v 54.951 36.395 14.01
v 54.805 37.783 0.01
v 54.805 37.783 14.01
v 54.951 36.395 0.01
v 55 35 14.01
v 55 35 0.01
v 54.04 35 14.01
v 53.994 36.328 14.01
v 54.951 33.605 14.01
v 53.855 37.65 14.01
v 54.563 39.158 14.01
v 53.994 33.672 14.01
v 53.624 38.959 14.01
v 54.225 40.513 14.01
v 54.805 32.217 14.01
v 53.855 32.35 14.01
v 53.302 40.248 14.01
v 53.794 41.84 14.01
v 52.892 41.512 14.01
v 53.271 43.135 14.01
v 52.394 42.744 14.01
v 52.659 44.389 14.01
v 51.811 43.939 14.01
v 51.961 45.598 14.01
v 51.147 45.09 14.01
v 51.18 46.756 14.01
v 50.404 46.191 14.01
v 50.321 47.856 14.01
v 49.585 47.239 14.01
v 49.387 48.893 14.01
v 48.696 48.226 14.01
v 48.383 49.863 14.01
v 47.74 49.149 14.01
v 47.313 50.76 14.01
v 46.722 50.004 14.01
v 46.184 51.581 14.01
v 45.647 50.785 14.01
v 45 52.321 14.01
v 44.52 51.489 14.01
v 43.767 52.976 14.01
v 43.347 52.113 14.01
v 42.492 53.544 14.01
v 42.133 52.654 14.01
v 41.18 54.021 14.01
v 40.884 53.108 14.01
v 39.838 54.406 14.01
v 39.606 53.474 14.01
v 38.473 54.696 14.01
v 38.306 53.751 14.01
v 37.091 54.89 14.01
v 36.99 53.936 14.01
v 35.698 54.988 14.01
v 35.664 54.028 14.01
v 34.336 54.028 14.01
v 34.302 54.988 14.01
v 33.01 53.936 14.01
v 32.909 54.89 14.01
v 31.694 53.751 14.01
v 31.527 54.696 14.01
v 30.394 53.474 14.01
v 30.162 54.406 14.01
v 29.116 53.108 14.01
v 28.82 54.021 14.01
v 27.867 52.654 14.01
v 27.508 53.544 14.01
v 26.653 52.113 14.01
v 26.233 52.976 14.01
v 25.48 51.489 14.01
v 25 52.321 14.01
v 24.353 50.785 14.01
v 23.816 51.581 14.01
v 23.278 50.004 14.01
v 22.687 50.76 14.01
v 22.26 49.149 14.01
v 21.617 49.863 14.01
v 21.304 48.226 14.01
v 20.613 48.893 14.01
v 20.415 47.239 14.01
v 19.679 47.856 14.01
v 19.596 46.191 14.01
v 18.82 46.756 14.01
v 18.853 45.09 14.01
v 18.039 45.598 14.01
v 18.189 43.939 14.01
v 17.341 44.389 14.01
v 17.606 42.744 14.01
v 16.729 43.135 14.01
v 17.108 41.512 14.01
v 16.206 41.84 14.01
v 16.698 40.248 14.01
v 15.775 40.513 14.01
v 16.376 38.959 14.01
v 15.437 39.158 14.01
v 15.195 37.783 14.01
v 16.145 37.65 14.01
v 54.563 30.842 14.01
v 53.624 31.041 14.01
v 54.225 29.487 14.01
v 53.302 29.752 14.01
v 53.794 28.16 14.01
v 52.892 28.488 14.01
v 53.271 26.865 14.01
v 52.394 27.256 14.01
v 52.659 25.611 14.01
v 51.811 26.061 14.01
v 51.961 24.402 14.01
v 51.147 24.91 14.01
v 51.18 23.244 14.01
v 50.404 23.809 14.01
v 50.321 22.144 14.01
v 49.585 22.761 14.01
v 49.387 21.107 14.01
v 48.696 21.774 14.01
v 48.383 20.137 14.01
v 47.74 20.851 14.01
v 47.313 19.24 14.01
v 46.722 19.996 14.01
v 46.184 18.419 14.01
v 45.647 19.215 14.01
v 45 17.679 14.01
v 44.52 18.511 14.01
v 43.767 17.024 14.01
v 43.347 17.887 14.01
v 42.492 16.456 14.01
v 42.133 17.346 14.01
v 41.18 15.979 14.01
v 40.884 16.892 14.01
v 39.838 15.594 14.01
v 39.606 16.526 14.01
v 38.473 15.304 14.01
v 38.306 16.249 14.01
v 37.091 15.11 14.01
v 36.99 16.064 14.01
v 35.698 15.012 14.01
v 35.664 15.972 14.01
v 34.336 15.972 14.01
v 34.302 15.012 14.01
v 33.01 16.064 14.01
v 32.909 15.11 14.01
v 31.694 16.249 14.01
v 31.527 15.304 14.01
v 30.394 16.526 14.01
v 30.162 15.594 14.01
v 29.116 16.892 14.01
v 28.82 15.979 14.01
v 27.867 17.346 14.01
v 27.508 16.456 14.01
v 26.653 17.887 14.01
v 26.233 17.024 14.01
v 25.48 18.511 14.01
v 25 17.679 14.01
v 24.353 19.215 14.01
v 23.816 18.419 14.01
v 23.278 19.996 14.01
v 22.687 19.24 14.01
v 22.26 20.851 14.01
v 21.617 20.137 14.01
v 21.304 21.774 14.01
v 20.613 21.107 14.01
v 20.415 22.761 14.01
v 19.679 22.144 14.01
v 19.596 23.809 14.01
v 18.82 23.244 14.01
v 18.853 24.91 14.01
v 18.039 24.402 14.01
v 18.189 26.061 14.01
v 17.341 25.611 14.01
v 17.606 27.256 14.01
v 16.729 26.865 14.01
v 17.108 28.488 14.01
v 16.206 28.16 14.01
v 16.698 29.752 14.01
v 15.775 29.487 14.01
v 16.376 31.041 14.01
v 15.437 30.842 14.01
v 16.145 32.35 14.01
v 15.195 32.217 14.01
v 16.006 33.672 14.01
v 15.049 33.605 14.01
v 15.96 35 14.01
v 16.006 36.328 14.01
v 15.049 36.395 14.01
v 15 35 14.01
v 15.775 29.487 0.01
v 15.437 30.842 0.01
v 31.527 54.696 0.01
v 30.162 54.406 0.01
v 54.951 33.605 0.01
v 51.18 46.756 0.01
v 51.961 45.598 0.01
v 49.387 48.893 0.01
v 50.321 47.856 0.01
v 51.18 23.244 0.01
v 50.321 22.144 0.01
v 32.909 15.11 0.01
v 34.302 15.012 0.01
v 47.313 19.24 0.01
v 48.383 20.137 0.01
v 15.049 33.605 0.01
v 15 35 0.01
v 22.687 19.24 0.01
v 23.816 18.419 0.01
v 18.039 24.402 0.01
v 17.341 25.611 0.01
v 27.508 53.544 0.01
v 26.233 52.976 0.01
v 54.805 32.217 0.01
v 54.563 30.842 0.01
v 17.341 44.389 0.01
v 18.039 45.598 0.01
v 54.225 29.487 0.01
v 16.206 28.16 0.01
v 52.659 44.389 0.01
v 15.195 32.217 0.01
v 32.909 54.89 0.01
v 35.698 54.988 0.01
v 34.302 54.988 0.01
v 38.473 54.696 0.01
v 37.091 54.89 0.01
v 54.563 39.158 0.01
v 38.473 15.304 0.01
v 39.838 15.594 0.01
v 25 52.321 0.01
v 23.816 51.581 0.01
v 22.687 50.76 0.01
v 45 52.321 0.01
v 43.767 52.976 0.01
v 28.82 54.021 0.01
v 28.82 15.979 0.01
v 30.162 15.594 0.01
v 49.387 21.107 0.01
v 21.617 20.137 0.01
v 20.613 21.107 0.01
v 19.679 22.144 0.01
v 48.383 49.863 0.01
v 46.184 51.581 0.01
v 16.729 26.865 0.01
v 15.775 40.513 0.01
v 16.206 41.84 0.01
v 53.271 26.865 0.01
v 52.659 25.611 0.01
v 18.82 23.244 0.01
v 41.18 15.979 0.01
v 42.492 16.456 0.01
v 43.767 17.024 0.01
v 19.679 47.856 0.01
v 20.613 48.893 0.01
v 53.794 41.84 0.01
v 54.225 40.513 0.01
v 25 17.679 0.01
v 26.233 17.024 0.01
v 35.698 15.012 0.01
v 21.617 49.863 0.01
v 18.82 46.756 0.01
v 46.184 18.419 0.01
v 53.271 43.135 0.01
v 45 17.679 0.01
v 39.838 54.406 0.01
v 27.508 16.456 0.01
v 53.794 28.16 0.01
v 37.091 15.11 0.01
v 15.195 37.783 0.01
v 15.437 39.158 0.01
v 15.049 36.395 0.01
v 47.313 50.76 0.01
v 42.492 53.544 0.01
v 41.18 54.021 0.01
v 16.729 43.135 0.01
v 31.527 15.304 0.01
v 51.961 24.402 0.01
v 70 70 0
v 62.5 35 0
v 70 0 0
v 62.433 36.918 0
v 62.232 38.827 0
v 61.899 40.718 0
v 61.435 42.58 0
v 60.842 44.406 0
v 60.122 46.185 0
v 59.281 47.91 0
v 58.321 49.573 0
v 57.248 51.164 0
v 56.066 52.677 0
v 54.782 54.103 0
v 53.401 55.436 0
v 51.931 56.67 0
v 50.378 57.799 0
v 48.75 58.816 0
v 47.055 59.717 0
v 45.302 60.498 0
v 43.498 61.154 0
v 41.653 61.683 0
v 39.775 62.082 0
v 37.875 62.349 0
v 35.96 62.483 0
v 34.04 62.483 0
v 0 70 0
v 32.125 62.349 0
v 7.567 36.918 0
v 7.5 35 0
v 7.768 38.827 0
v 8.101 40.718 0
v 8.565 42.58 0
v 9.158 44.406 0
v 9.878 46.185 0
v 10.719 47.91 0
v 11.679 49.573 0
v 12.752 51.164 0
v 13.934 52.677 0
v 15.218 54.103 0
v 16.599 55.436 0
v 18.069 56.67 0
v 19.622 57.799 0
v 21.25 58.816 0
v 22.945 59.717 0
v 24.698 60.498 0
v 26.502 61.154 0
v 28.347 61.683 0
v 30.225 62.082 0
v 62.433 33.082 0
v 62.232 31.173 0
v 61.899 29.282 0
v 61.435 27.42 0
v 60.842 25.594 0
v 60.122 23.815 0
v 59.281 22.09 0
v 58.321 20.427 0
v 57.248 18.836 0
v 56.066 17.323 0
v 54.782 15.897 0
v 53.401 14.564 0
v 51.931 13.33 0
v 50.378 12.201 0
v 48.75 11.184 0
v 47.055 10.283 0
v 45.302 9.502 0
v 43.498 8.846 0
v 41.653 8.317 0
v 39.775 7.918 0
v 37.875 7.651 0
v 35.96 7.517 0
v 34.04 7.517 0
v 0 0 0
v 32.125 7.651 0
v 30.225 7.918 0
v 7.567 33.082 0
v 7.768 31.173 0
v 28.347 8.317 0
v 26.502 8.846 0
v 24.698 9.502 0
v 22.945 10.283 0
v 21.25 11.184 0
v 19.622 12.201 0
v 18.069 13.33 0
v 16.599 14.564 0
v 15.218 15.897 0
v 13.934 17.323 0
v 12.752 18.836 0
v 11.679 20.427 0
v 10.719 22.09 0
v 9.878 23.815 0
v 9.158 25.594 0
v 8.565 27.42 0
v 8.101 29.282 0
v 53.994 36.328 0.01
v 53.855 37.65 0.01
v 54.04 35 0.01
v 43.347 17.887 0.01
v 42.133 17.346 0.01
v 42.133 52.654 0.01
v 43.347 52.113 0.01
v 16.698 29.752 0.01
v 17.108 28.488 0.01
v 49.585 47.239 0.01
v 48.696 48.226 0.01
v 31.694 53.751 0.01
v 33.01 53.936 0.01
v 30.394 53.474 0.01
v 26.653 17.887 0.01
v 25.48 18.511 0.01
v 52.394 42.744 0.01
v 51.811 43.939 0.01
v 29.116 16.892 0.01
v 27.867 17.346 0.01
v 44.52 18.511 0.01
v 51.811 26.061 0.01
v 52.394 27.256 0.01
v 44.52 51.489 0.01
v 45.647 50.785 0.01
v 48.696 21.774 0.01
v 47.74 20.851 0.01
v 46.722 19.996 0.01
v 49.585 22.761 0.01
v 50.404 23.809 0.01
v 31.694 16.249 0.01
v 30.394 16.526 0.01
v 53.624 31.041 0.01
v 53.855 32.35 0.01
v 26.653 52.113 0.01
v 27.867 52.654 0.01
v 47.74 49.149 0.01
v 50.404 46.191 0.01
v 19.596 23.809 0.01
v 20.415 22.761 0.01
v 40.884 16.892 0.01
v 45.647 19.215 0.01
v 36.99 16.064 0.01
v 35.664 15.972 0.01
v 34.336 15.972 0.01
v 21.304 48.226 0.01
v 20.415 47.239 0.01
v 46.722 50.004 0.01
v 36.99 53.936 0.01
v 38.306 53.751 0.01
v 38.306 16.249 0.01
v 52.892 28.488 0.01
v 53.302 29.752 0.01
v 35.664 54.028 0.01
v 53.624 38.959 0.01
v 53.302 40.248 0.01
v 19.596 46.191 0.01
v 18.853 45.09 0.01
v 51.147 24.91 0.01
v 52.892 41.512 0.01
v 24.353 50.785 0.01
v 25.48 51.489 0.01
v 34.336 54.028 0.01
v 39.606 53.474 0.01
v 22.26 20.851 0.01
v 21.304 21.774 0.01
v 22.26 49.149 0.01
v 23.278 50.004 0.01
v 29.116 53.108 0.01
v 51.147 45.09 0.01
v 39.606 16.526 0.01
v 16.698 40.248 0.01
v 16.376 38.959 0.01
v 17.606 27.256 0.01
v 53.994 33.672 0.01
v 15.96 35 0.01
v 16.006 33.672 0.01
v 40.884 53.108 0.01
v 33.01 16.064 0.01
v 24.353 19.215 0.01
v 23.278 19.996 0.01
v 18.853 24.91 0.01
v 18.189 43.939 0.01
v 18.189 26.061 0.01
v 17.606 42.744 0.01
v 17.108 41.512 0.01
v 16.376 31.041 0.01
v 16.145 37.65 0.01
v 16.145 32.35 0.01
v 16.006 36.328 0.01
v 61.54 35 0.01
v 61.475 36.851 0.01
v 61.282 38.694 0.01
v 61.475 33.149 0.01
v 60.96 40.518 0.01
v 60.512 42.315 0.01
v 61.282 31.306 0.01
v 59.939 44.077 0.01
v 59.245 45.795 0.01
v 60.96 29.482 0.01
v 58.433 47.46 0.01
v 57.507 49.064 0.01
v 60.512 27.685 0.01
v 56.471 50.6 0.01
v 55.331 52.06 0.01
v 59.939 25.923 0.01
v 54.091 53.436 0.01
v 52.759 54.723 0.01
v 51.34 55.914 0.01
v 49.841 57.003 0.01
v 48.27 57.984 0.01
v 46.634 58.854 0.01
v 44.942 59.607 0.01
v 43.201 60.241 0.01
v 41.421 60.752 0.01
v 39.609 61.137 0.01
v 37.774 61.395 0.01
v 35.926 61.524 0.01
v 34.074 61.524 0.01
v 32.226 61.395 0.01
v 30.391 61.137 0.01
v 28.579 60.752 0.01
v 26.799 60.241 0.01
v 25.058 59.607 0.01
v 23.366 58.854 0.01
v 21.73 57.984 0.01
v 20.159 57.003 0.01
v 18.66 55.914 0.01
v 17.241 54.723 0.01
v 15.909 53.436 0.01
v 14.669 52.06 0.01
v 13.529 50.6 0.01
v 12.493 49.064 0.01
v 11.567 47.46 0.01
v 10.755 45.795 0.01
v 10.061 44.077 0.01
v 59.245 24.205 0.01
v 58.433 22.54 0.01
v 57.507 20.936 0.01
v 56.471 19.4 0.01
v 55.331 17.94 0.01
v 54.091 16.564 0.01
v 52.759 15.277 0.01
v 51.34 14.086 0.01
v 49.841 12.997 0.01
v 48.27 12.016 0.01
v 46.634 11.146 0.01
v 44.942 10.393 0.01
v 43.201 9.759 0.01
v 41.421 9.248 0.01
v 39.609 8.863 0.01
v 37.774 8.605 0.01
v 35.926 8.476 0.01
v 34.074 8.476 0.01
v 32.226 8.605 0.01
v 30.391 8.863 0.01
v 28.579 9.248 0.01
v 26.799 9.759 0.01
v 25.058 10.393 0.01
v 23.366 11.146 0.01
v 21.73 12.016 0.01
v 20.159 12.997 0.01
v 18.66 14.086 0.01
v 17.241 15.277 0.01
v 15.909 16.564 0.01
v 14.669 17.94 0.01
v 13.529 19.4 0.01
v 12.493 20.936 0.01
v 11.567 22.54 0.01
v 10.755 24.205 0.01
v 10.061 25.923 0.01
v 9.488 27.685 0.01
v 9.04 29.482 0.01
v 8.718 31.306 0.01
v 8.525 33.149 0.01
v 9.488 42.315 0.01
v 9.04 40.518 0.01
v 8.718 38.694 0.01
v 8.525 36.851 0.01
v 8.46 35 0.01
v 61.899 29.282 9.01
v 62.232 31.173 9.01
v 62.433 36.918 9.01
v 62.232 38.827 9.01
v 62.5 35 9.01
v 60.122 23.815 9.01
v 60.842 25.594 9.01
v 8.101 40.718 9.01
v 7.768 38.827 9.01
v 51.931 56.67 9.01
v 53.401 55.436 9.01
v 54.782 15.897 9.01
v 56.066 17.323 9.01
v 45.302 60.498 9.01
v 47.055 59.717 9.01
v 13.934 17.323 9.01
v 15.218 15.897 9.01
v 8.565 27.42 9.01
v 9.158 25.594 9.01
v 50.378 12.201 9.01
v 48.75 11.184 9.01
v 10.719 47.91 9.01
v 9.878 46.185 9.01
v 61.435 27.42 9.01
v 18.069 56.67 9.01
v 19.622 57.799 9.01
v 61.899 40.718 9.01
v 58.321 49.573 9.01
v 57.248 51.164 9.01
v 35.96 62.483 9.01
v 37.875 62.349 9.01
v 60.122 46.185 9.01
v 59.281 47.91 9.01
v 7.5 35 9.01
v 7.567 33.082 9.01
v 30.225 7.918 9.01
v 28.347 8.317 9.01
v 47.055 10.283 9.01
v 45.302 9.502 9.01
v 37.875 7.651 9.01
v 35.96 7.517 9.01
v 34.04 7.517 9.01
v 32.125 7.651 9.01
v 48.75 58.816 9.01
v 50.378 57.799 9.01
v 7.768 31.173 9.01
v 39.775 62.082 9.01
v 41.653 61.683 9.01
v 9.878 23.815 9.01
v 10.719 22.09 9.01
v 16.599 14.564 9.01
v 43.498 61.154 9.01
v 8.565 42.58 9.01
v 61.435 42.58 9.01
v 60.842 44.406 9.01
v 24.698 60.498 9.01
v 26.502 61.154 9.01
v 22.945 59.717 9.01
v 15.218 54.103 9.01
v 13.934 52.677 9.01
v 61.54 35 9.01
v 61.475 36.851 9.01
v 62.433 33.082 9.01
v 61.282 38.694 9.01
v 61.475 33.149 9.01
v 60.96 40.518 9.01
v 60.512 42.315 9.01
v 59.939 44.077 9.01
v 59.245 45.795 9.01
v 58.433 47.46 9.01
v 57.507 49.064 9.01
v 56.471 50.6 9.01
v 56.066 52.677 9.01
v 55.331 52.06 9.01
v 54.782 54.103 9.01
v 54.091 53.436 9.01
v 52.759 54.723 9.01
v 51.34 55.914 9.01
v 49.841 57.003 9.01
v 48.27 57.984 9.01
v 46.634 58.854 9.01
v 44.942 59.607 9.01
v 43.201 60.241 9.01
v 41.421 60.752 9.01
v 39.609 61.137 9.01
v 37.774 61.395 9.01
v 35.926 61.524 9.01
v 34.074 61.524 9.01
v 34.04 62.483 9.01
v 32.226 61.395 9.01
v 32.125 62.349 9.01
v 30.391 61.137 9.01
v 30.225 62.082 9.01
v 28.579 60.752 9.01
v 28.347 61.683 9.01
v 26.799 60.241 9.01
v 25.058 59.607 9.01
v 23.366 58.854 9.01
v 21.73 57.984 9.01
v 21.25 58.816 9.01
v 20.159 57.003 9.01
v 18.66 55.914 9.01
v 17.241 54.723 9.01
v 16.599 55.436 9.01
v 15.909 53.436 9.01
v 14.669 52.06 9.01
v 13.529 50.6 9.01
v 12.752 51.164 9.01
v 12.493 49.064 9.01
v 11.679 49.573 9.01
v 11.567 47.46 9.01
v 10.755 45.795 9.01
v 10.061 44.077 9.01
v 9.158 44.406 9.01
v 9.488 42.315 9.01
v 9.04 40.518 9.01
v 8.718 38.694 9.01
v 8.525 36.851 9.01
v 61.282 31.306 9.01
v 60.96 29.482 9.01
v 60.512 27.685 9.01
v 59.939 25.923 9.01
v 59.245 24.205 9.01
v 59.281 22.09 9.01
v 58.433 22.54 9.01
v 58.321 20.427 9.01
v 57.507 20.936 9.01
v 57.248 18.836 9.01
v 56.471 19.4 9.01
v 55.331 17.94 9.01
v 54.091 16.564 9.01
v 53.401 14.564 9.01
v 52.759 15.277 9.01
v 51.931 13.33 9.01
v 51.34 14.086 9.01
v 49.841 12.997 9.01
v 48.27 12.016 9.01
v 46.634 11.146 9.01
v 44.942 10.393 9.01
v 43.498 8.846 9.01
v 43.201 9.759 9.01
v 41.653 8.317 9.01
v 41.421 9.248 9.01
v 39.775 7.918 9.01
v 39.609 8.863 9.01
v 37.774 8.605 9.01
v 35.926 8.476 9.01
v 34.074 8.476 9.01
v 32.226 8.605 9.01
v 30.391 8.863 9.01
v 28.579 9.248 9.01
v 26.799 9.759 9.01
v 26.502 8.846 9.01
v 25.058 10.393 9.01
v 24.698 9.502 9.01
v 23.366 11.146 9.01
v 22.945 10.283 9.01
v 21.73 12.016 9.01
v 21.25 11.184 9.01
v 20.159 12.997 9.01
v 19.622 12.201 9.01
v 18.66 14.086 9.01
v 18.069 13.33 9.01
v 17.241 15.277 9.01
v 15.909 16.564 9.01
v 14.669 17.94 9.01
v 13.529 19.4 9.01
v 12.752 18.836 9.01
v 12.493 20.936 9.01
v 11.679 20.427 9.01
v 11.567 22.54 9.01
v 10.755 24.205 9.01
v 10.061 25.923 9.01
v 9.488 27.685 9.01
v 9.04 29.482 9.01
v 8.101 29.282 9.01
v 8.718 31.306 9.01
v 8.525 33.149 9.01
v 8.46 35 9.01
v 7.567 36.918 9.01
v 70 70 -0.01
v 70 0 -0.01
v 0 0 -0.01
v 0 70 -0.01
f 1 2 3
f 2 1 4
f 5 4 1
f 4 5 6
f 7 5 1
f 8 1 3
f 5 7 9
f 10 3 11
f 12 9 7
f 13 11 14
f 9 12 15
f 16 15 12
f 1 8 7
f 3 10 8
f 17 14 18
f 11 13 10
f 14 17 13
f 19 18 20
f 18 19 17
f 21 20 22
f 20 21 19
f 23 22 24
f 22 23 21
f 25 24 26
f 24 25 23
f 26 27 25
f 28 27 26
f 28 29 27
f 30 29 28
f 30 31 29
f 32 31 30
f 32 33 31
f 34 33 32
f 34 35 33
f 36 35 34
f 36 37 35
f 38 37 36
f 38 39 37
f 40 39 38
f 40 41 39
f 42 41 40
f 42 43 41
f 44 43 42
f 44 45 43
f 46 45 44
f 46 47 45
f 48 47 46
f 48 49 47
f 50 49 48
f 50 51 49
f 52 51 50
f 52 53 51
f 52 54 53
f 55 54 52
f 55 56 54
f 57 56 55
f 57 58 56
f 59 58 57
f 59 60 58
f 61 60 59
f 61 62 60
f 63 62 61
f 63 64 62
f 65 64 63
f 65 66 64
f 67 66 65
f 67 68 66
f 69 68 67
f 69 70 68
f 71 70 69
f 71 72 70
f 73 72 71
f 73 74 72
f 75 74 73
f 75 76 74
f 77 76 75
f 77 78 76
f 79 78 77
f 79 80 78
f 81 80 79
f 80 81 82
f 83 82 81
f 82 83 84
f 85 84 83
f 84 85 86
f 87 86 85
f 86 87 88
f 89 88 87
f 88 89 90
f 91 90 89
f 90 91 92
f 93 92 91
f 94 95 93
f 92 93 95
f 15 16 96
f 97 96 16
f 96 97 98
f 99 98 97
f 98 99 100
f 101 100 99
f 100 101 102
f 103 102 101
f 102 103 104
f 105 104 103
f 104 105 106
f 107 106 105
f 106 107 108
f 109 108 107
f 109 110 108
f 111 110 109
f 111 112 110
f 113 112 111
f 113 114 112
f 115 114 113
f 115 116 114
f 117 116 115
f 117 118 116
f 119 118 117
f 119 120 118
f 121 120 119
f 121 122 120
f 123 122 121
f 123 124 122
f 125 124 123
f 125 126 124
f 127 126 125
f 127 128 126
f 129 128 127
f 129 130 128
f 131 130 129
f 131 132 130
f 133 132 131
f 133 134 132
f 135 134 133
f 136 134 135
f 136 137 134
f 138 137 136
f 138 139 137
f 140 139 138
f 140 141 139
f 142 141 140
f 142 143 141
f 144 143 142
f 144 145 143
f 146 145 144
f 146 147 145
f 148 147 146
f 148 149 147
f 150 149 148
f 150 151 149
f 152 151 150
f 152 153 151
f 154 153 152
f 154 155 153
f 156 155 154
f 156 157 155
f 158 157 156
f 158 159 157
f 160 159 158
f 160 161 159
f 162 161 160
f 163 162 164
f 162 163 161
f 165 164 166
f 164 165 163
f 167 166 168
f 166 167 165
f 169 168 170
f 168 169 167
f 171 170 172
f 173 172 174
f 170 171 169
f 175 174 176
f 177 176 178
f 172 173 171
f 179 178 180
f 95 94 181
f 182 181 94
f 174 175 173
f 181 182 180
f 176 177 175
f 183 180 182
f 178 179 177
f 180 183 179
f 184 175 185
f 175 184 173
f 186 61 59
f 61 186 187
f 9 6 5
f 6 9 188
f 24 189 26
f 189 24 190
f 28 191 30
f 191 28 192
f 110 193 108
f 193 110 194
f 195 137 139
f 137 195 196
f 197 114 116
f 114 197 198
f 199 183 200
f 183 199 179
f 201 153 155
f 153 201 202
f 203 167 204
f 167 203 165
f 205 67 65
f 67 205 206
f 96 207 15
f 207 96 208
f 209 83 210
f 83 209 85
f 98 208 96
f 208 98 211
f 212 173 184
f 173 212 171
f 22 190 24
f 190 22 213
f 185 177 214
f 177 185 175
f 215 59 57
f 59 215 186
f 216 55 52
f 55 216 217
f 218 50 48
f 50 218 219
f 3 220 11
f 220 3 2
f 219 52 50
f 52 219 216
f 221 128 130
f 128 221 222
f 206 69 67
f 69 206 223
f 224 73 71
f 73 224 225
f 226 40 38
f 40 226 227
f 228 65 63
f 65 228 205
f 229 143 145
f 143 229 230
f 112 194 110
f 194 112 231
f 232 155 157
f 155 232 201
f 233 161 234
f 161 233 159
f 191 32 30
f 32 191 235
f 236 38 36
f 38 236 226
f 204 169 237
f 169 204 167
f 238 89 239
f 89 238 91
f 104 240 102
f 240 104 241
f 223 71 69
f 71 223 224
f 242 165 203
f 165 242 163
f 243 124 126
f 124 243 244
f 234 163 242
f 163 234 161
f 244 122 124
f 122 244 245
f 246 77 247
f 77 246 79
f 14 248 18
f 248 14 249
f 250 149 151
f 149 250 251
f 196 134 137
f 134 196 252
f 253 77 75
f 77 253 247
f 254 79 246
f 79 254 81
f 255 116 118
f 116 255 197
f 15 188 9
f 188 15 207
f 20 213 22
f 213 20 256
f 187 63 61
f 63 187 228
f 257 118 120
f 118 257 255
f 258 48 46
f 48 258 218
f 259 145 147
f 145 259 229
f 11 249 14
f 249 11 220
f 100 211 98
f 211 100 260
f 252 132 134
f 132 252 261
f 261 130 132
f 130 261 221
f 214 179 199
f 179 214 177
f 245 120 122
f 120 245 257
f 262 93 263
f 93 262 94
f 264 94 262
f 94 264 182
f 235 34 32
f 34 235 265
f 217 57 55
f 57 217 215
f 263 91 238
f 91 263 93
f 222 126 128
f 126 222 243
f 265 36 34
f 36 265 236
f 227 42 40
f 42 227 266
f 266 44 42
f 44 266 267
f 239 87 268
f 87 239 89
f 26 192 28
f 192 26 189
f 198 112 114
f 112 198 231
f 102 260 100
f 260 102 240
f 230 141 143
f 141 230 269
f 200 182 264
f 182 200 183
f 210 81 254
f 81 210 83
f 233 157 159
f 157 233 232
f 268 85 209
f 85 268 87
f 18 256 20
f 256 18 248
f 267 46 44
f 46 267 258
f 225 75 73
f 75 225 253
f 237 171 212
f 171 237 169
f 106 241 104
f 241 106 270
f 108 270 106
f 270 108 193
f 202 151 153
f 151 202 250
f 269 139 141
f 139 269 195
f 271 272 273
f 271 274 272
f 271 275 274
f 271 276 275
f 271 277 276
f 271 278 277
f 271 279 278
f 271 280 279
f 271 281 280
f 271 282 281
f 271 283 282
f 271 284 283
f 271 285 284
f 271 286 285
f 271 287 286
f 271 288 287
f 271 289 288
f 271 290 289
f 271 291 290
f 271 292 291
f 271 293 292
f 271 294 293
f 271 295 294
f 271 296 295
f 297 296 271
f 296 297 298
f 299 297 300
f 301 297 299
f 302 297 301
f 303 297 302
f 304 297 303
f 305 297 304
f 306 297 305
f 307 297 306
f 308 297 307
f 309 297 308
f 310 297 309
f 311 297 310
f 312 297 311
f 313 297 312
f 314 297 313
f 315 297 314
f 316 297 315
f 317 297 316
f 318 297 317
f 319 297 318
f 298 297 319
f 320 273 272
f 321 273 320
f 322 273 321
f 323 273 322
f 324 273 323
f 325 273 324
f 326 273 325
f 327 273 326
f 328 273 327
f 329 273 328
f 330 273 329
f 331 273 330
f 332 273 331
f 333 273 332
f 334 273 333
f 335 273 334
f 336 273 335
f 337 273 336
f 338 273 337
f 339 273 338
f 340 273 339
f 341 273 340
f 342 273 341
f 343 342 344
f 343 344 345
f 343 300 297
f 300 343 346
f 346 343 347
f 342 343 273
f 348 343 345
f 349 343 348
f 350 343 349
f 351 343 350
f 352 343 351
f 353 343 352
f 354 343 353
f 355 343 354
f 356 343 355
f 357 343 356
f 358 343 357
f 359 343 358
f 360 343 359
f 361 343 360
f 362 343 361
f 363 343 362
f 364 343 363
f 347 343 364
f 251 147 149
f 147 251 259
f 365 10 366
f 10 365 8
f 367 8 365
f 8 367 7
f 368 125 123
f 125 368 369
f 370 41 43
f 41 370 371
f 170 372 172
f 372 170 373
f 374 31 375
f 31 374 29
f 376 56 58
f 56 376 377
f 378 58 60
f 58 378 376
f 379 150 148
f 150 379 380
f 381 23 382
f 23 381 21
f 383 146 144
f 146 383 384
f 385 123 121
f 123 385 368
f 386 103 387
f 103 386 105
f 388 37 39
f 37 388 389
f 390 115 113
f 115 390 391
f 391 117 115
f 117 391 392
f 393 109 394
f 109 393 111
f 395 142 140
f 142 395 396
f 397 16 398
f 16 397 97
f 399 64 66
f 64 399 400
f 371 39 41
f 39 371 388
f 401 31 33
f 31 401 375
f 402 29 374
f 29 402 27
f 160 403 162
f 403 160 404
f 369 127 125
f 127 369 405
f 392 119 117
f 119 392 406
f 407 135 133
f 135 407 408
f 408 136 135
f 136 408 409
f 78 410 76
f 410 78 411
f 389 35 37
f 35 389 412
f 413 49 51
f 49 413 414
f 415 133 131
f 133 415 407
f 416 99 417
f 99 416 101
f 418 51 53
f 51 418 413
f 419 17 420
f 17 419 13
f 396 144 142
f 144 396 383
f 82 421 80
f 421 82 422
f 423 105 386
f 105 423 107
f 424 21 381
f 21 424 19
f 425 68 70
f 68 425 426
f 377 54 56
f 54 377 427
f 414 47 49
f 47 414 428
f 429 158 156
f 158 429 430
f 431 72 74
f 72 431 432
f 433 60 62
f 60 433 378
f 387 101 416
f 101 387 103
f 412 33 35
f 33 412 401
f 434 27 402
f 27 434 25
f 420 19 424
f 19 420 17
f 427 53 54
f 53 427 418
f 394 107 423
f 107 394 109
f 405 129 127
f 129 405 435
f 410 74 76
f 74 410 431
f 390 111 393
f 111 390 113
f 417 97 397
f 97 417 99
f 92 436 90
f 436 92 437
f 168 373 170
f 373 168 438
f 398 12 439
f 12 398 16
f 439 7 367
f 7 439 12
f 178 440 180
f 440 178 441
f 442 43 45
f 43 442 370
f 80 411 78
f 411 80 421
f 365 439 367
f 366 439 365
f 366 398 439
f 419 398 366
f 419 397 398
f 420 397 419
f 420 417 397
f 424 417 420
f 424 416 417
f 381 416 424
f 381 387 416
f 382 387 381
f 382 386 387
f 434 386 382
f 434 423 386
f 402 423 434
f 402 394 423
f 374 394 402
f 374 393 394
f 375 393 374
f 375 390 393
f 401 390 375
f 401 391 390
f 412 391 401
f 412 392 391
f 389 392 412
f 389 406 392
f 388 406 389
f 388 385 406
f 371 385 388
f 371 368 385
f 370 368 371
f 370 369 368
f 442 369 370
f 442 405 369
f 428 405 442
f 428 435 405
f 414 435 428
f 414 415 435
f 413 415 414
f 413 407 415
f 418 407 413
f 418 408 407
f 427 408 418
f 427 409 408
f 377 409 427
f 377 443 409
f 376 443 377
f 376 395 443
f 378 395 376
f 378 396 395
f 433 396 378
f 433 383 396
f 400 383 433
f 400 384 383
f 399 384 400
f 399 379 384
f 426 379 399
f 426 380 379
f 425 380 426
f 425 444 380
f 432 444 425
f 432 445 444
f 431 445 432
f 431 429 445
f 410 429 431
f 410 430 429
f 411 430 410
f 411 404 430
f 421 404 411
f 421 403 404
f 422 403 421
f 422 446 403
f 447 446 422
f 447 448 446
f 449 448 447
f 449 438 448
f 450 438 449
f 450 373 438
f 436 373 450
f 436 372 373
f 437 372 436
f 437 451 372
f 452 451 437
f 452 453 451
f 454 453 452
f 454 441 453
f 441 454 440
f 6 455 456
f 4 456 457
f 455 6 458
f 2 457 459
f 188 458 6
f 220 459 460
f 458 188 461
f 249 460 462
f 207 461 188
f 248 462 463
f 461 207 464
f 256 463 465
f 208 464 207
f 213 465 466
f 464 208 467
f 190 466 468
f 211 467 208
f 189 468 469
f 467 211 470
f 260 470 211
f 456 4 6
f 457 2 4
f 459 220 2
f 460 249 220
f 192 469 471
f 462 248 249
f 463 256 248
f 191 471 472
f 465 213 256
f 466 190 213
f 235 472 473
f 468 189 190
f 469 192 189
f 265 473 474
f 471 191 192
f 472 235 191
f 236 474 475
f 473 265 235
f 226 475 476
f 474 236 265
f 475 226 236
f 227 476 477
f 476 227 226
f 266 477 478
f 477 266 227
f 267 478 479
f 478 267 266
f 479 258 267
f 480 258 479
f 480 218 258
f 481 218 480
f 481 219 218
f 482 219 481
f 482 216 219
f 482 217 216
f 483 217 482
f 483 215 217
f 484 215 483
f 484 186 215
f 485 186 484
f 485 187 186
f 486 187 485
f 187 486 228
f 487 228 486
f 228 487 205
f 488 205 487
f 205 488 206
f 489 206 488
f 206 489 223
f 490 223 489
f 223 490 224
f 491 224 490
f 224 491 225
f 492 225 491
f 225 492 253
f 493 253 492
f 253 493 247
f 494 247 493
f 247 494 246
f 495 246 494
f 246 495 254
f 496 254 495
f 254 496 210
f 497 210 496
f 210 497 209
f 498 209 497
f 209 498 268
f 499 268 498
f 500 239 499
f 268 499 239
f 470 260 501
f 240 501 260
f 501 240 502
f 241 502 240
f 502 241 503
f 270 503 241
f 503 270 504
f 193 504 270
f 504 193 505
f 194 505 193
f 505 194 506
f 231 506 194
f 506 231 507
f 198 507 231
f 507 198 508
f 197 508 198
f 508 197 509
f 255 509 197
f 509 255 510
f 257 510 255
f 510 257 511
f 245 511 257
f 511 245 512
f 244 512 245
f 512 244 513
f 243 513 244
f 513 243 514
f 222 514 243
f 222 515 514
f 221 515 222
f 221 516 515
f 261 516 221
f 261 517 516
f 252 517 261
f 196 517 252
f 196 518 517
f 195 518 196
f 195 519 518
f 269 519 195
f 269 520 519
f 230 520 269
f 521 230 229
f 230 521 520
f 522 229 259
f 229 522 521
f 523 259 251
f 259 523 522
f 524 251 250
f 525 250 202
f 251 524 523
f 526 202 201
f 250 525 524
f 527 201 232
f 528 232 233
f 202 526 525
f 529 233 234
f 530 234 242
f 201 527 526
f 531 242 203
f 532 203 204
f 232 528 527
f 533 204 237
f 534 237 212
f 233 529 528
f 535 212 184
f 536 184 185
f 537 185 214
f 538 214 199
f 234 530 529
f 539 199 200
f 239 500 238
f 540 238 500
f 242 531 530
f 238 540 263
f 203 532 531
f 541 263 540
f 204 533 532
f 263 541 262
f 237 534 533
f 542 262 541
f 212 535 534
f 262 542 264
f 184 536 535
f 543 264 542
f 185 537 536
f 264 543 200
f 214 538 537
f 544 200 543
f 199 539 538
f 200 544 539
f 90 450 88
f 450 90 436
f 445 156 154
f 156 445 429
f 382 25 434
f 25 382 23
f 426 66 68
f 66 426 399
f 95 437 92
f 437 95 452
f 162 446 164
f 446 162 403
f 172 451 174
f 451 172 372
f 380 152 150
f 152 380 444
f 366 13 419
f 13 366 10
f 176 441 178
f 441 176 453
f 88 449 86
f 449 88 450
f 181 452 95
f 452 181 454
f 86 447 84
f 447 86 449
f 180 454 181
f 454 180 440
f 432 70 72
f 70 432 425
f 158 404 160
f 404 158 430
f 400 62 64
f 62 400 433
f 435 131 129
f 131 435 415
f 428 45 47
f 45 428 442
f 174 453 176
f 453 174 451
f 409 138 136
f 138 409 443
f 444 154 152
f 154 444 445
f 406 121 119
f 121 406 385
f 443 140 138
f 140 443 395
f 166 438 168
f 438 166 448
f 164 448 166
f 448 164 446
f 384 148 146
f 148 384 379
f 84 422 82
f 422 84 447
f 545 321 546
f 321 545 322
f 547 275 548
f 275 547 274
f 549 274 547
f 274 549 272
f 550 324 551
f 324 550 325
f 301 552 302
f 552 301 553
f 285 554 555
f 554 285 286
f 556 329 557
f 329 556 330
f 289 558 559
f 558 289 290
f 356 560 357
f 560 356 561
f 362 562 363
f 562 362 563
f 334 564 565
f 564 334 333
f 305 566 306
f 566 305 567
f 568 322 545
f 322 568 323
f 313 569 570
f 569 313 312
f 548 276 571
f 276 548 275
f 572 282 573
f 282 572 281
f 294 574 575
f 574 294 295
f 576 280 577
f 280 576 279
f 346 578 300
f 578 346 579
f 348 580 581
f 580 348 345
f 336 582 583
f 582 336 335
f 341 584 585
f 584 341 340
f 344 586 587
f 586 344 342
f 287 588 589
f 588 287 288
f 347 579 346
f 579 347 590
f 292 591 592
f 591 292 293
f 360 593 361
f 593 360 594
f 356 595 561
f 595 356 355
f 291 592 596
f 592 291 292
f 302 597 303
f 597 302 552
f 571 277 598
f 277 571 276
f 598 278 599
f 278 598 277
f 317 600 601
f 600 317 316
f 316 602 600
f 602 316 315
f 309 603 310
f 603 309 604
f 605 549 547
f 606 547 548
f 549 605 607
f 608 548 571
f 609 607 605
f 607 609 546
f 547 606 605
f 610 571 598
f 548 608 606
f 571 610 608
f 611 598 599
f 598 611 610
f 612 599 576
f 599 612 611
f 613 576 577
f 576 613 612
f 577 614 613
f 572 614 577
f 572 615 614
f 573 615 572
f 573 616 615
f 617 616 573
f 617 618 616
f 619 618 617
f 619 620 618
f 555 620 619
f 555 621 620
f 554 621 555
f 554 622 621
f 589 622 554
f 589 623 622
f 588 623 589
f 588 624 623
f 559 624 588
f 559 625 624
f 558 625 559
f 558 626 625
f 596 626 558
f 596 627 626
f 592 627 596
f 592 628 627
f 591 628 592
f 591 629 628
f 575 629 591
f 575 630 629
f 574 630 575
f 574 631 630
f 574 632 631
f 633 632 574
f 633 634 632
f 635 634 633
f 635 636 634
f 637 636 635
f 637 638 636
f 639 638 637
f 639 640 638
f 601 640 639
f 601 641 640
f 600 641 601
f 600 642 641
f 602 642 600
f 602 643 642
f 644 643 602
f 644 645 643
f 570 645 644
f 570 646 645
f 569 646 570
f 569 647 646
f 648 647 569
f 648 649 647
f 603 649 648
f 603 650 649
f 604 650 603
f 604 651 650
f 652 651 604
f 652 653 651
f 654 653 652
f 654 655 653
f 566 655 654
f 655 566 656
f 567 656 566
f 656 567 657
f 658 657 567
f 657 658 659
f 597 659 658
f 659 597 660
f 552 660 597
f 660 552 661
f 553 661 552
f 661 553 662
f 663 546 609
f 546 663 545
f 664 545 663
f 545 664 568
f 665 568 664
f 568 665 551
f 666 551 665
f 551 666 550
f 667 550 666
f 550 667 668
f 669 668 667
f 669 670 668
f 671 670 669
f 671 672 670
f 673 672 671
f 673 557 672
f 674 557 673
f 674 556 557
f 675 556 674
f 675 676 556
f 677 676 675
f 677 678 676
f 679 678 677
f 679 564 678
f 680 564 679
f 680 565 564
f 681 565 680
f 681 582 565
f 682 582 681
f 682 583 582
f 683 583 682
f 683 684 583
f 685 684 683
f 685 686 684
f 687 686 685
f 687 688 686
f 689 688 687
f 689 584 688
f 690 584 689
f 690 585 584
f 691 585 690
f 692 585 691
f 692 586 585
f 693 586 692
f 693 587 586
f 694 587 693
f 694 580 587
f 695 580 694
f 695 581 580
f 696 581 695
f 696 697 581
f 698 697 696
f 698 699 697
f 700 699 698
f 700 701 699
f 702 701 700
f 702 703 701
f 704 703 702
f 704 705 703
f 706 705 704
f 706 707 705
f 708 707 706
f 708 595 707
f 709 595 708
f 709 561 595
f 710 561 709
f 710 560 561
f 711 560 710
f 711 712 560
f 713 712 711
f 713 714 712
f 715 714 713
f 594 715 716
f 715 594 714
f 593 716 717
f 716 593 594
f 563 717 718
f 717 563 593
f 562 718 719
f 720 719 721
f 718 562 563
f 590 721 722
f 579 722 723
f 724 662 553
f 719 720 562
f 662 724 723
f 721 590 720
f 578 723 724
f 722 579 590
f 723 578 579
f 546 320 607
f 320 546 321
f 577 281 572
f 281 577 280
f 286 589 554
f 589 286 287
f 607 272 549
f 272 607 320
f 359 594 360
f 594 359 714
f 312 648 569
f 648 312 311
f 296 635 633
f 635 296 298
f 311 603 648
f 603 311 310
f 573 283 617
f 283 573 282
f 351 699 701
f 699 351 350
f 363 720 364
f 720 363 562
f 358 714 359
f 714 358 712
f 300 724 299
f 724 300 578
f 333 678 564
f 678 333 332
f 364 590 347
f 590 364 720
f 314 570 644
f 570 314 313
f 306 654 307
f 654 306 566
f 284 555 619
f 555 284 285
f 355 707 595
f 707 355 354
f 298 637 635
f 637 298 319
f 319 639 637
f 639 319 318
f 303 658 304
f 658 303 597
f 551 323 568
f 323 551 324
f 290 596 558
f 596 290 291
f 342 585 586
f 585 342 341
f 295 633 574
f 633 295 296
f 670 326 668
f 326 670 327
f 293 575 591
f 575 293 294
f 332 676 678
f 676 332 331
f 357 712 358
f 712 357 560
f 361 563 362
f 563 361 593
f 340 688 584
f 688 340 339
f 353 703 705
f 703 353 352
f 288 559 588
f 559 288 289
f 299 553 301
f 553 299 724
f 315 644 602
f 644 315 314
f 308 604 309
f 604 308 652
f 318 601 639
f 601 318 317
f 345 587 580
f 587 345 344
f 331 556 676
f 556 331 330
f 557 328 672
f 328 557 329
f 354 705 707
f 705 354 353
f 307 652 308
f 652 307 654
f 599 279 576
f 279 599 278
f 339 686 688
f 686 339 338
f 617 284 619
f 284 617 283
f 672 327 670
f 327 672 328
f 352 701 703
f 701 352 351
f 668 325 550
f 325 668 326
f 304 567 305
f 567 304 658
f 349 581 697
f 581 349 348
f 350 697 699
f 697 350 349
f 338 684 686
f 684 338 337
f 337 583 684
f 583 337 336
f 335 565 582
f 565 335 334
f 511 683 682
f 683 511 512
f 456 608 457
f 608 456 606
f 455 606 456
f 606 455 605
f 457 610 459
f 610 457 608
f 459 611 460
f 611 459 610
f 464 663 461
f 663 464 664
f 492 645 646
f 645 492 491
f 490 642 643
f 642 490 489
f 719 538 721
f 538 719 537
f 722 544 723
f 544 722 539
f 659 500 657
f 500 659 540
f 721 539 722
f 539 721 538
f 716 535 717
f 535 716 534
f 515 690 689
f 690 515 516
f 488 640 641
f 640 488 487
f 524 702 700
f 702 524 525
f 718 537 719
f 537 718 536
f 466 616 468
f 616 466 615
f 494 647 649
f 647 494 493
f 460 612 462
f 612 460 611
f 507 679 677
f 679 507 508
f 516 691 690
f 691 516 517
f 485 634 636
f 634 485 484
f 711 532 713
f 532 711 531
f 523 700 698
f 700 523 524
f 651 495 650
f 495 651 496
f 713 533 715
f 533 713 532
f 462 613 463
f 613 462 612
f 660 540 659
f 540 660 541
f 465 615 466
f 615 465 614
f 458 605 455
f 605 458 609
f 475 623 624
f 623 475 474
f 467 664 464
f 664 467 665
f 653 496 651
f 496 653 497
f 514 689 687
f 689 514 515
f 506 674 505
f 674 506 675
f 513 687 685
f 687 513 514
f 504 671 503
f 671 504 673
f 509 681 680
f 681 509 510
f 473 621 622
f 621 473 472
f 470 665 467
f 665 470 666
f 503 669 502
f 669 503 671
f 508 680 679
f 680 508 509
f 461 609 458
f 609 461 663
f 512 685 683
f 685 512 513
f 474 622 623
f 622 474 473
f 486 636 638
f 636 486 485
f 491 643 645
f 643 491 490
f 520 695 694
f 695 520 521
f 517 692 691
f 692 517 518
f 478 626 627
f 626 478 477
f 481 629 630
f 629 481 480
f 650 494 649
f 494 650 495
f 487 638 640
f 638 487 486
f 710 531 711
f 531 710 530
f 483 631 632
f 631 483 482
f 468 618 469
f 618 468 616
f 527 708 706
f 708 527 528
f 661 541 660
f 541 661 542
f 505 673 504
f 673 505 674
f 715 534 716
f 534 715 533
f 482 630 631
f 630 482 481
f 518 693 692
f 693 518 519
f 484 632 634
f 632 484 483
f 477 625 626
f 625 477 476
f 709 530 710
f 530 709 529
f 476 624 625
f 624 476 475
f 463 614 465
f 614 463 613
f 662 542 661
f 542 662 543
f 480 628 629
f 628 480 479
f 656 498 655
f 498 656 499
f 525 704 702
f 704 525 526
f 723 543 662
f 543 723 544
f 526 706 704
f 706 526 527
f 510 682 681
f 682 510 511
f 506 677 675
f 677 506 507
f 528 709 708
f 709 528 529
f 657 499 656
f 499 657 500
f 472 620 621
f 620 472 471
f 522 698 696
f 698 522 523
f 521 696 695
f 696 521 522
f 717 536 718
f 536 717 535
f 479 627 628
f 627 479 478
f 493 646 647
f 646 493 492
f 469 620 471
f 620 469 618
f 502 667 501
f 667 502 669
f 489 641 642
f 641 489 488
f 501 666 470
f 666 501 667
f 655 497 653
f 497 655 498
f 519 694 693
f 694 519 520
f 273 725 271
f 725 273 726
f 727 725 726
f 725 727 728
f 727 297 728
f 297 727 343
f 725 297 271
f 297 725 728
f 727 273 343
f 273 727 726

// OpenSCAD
// file: ../Base/PlacementOptions.scad
// Fischertechnik Box Foundation
// Placement Options

// Alignment
NoAlign = 0;
AlignLeft = 1;
AlignBottom = 2;
AlignCenter = 3;
AlignRight = 4;
AlignTop = 5;

// Element rotation degree steps
rotations = [0, -90, -180, -270];

// Rotation
NoRotation = 0;
Rotate0 = 0;
Rotate90 = 1;
Rotate180 = 2;
Rotate270 = 3;

// Docking (seen from above)
NoDock = -1;
DockLeft = 0;
DockTop = 1;
DockRight = 2;
DockCorner = 2;
DockBottom = 3;

// Web corners
LowerLeft = 0;
UpperLeft = 1;
UpperRight = 2;
LowerRight = 3;

// Web position relative to corner
LeftOfCorner = 0;
RightOfCorner = 1;
// file: ../Base/Boxes.scad
// Fischertechnik Box Foundation
// Pre-designed Boxes

use <Constants.scad>

include <PlacementOptions.scad>

box190Width = 190;
box190Depth = 130;
box130Width = 130;
box130Depth = 95;

// Values are from an original ec3 box
topBottomDifference = 1.5;
outerHeight = 40;
innerHeight = 38.2;
baseThickness = outerHeight - innerHeight;
stackExcess = 5.7;
radius = 3.5;
wallThickness = 1.5;
tolerance = 0.2;
stackOffset = innerHeight - stackExcess;

boxUsageHeight = stackOffset;
boxWallThickness = wallThickness;
boxBaseThickness = baseThickness;
boxWebWidth = 3.0;

// getBoxWallThickness()
// Gets the wall thickness of a Fischertechnik Box
function getBoxWallThickness() = boxWallThickness;

// getBoxUsageHeight()
// Gets the usable height of a Fischertechnik box
function getBoxUsageHeight() = boxUsageHeight;

// getBoxInnerHeight()
// Gets the inner height of a Fischertechnik box, including the stack excess
function getBoxInnerHeight() = innerHeight;

// getBoxBaseThickness()
// Gets the thickness of the Fischertechnik box base.
function getBoxBaseThickness() = boxBaseThickness;

// getBoxWebWidth()
// Gets the width of a box web
function getBoxWebWidth() = boxWebWidth;

// getBox190Space()
// Gets the usable inner space of a Box 190 as an x/y-list
function getBox190Space() = [
    box190Width - 2*getBoxWallThickness() - topBottomDifference, 
    box190Depth - 2*getBoxWallThickness() - topBottomDifference ];

// BoxBase(width, depth)
// Creates an empty stackable Fischertechnik compatible box
// width = Outer width of the box (190, 130, ...)
// depth = Outer depth of the box (130, 95, ...)

module BoxBase(width, depth, height=outerHeight) {    
    thinPlate = 0.01;

    innerHeight = height - baseThickness;    
    
    module BodyPlate(width, depth) {
        translate([radius, radius])
        hull() {
            w = width-2*radius;
            d = depth-2*radius;
            cube([w, d, thinPlate]);
            cylinder(thinPlate, r=radius, $fn=getFragments());
            translate([w, 0])
                cylinder(thinPlate, r=radius, $fn=getFragments());
            translate([w, d])
                cylinder(thinPlate, r=radius, $fn=getFragments());
            translate([0, d])
                cylinder(thinPlate, r=radius, $fn=getFragments());
        }
    }
    
    module Body(tolerance=tolerance) {
        hull() {
            // Bottom with tolerance to fit into the original boxes when stacked
            translate([-wallThickness+tolerance, -wallThickness+tolerance, -baseThickness])
                BodyPlate(width-topBottomDifference-2*tolerance, depth-topBottomDifference-2*tolerance);
            
            // Top
            translate([-wallThickness-topBottomDifference/2, -wallThickness-topBottomDifference/2, innerHeight-thinPlate])
                BodyPlate(width, depth);
         }
    }

    module Cutoff() {
        hull() {
            coWidth = width - 2*wallThickness;
            coDepth = depth - 2*wallThickness;
            
            // Bottom
            BodyPlate(coWidth-topBottomDifference, coDepth-topBottomDifference);

            // Top
            translate([-topBottomDifference/2, -topBottomDifference/2, innerHeight+thinPlate]) 
                BodyPlate(coWidth, coDepth);
        }
    }
    
    difference() {        
        Body();
        Cutoff();
        stackOffset = innerHeight - stackExcess;
        translate([0, 0, stackOffset + baseThickness])
            Body(tolerance=0);
    }
}

// Creates the Fischertechnik empty box 130x190 mm and places it at position 0,0
// 190x130 are the outer sizes, the inner space is slightly smaller. Use getBox190Space() to get the inner sizes.
// The box is positioned that the usable inner space is at the 0,0,0 position. The

module Box190() {
    BoxBase(box190Width, box190Depth);
}

// Gets the usable inner space of a Box 130 as an x/y-list
function getBox130Space() = [
    box130Width - 2*getBoxWallThickness() - topBottomDifference, 
    box130Depth - 2*getBoxWallThickness() - topBottomDifference ];

// Creates the Fischertechnik empty box 95x130 mm and places it at position 0,0
// 190x130 are the outer sizes, the inner space is slightly smaller. Use getBox190Space() to get the inner sizes.
// The box is positioned that the usable inner space is at the 0,0,0 position. The

module Box130() {
    BoxBase(box130Width, box130Depth);
}

// Creates a web at the specified box walls
// corner 0 = LowerLeft, 1 = UpperLeft, 2 = UpperRight, 3 = LowerRight
// side 0 = LeftOfCorner, 1 = RightOfCorner
// distance = Distance in mm from the corner
// boxSpace = inner width and depth of the box (default: Box 190)
// webWidth = length of the web (default is 3 mms)
// webThickness = thickness of the web (default is 1 mm)

module BoxWeb(corner, side, distance, boxSpace=getBox190Space(), webWidth=getBoxWebWidth(), webThickness=1.0) {
    sink = getBoxWallThickness()/2;

    width = (corner % 2 == 0) ? 
            (side == LeftOfCorner ? webWidth : webThickness) :
            (side == LeftOfCorner ? webThickness : webWidth);

    depth = (corner % 2 == 0) ? 
            (side == RightOfCorner ? webWidth : webThickness) :
            (side == RightOfCorner ? webThickness : webWidth);
    
    xDiff = corner == LowerLeft ? 
                (side == LeftOfCorner ? -sink : distance) :
            (corner == UpperLeft ?                
                (side == LeftOfCorner ? distance : -sink) :
            (corner == UpperRight ?
                (side == LeftOfCorner ? boxSpace.x-webWidth+sink : boxSpace.x-distance-webThickness) :
                (side == LeftOfCorner ? boxSpace.x-distance-webThickness: boxSpace.x-webWidth+sink)));

    yDiff = corner == LowerLeft ? 
                (side == RightOfCorner ? -sink : distance) :
            (corner == UpperLeft ?
                (side == RightOfCorner ? boxSpace.y-distance : boxSpace.y-webWidth+sink) :
            (corner == UpperRight ?
                (side == RightOfCorner ? boxSpace.y-webWidth+sink : boxSpace.y-distance) :
                (side == RightOfCorner ? distance : -sink)));
    
    translate([xDiff, yDiff, -getExcess()])
        cube([width, depth, boxUsageHeight + 2*getExcess()]);
}
// file: ../Base/Rotation.scad
// Fischertechnik Box Foundation
// Geometry Helpers Rotation

include <PlacementOptions.scad>

// getRotatedSpace(space, rotation=NoRotation)
// Rotates the space dependent on the specified rotation

function getRotatedSpace(space, rotation=NoRotation) = [
    (rotation == Rotate90 || rotation == Rotate270) ? space.y : space.x,
    (rotation == Rotate90 || rotation == Rotate270) ? space.x : space.y
];

// Rotates the given space around the fixed left lower corner
// space = the space the children needs as width/depth list [width,depth]
// rotation = 0 Rotate0 degrees, 1 Rotate90 degrees, 2 Rotate180 degrees, 3 Rotate270 degrees (equivalent to -90)

module RotateFix(space, rotation=NoRotation) {
    dy = (rotation == Rotate0 || rotation == Rotate270) ? 0 :
        (rotation == Rotate90) ? space.x :
        space.y;
    dx = (rotation < Rotate180) ? 0 :
        (rotation == Rotate180) ? space.x :
        space.y;
    
    translate([dx, dy, 0])
        rotate([0, 0, rotations[rotation]])
            children();
}
// file: ../Base/Alignment.scad
// Fischertechnik Box Foundation
// Geometry Helpers Alignment

include <PlacementOptions.scad>

// getAlignedX(elementWidth, spaceWidth, align=AlignRight, offset=0)
// Gets the aligned X offset of an element with the given
// width in the given space.
// elementWidth = The width of the element to positon
// spaceWidth = The space where the element should be aligned
// align = 0 AlignLeft, 1 AlignCenter, 2 AlignRight
// offset = an optional offset from the aligned position. When
// aligned left or centered, then positive values are in X direction.
// When aligned right then positive values are in negative X direction.

function getAlignedX(elementWidth, spaceWidth, align=AlignRight, offset=0) =
    (align == AlignLeft) ?
        offset :
        ((align == AlignCenter) ?
        (spaceWidth - elementWidth)/2 + offset :
        spaceWidth - offset - elementWidth);

// getAlignedY(elementDepth, spaceDepth, align=AlignTop, offset=0)
// Gets the aligned Y offset of an element with the given
// depth in the given space.
// elementDepth = The depth of the element to positon
// spaceDepth = The space where the element should be aligned
// align = 0 AlignBottom, 1 AlignCenter, 2 AlignTop
// offset = an optional offset from the aligned position. When
// aligned bottom or centered, then positive values are in Y direction.
// When aligned top then positive values are in negative Y direction.

function getAlignedY(elementDepth, spaceDepth, align=AlignTop, offset=0) =
    (align == AlignBottom) ?
        offset :
        ((align == AlignCenter) ?
        (spaceDepth - elementDepth)/2 + offset :
        spaceDepth - offset - elementDepth);
// file: ../Base/Placement.scad
// Fischertechnik Box Foundation
// Geometry Helpers Placement

use <Constants.scad>
use <Alignment.scad>
use <Rotation.scad>
use <Boxes.scad>

include <PlacementOptions.scad>

// Place(x=0, y=0, elementSpace=[0,0], alignX=AlignLeft, alignY=AlignBottom, rotation=Rotate0, boxSpace=getBox190Space())
// Places the child at the specified position
// y = Y-Position. This is a relative position when an X aligment is specified.
// x = X-Position. This is a relative position when an Y aligment is specified.
// elementSpace = space of the element to be placed [x,y]
// alignX = -1=NoAlign, 0 AlignLeft, 1 AlignCenter, 3 AlignRight (elementSpace and boxSpace required!)
// alignY = -1=NoAlign, 2 AlignBottom, 1 AlignCenter, 4 AlignTop (elementSpace and boxSpace required!)
// rotation = 0 Rotate0 0 degrees, 1 Rotate90 90 degrees, 
// 2 Rotate180 180 degrees, 3 Rotate270 270 degrees (equivalent to -90)
// boxSpace = Inner space of the box where the placement occurs [x,y] - default is Box 190x130 inner space

module Place(x=0, y=0, elementSpace=[0,0], 
  alignX=AlignLeft, alignY=AlignBottom, 
  rotation=NoRotation, boxSpace=getBox190Space()) {

    module Position(x, y, space, rotation=Rotate0) {
        translate([x, y, 0])
            RotateFix(space, rotation)
                children();
    }

    space = getRotatedSpace(elementSpace, rotation);
    alignedX = getAlignedX(space.x, boxSpace.x, alignX, x);
    alignedY = getAlignedY(space.y, boxSpace.y, alignY, y);
    Position(alignedX, alignedY, elementSpace, rotation)
        children();
}

// Center(space=getBox130Space(), elementSpace=[0,0])
// space = Space where the children is centered. For cylinder use centered=true and no elementSpace.
// elementSpace = space of the element to be centered [x,y]

module Center(space=getBox190Space(), elementSpace=[0,0]) {
    Place(elementSpace=elementSpace, boxSpace=space, alignX=AlignCenter, alignY=AlignCenter)
        children();
}

// CenterHorizontal(width=0, y=0, offset=0, space=getBox130Space())
// width = Width of the element to be placed.
// y = Y position of the element
// offset = Offset from the center position (negative will be left of the center)
// space = Space where the element is placed

module CenterHorizontal(width=0, y=0, offset=0, space=getBox190Space()) {
    Place(x=offset, y=y, elementSpace=[width, 0], boxSpace=space, alignX=AlignCenter)
        children(0);
}

// CenterVertical(depth=0, x=0, offset=0, space=getBox130Space())
// depth = Depth of the element to be placed.
// x = X position of the element
// offset = Offset from the center position (negative will be down of the center)
// space = Space where the element is placed

module CenterVertical(depth=0, x=0, offset=0, space=getBox190Space()) {
    Place(x=x, y=offset, elementSpace=[0, depth], boxSpace=space, alignY=AlignCenter)
        children(0);
}

// getIsVertical(align)
// True if the specified alignment needs a vertical orientation for a divider (AlignRight, AlignLeft)

function getIsVertical(align) = (align == AlignRight || align == AlignLeft);

// getIsHorizontal(align)
// True if the specified alignment needs a horizontal orientation for a divider (AlignTop, AlignBottom)

function getIsHorizontal(align) = (align == AlignTop || align == AlignBottom);
// file: ../Base/Constants.scad
// Fischertechnik Box Foundation
// Constants

// Constant values necessary for multiple elements

// Base constants
dividerThickness = 1.2;
excess = 0.01;
fragments = 90;
tolerance = 0.8;

// Gets the thickness of a divider 
function getDividerThickness() = dividerThickness;

// Gets the excess that is used to merge walls into each other
function getExcess() = excess;

// Gets amount of fragments of a cylinder
function getFragments() = fragments;

// Gets the inner tolerance of a frame to each side
function getTolerance() = tolerance;


// Fischertechnik specific constants
axisDiameter = 4;
axisBottomDiameter = axisDiameter + 1;
standardEdgeDistance = 2.5;
standardWebDistance = 11.5;
standardCornerLength = 15;
tubeWallFactor = 0.8;
smallPartsFrameHeight = 20;

// Gets axis diameter
function getAxisDiameter() = axisDiameter;

// Gets axis bottom diameter for thicker part at the bottom
function getAxisBottomDiameter() = axisBottomDiameter;

// gets the standard distance to the wall of the box for dockable frames with webs
function getStandardEdgeDistance() = standardEdgeDistance;

// gets the standard distance of each web to the corner of the dockable frame
function getStandardWebDistance() = standardWebDistance;

// gets the standard length of the corner walls of a dockable frame
function getStandardCornerLength() = standardCornerLength;

// gets the wall thickness of a tube.
function getTubeWallThickness() = tubeWallFactor * getDividerThickness();

// gets the frame height for docked small parts boxes.
function getSmallPartsFrameHeight() = smallPartsFrameHeight;
// main file
// Fischertechnik Box Library
// Cylinders for internal gear wheel
// 35694

use <../Base/Constants.scad>
use <../Base/Placement.scad>
use <../ModelBase/Simple.scad>
use <../ModelBase/Complex.scad>

width = 70;
depth = 70;
height = 14;

// getCylinderInternalGearWheelSpace
// Gets the space the cylinder for the internal gear wheel needs.

function getCylinderInternalGearWheelSpace() = [width, depth, height];

// CylinderInternalGearWheel
// Two cylinders for the internal gear wheel

module CylinderInternalGearWheel() {
    Space(getCylinderInternalGearWheelSpace());

    innerRingDiameter = 40;
    outerRingDiameter = 55;
    heightDifference = 5;
    Center(getCylinderInternalGearWheelSpace()) {
        Tube(height, outerDiameter=innerRingDiameter);
        Tube(height-heightDifference, outerDiameter=outerRingDiameter);
    }
}

// Test
color("lightgray")
CylinderInternalGearWheel();
